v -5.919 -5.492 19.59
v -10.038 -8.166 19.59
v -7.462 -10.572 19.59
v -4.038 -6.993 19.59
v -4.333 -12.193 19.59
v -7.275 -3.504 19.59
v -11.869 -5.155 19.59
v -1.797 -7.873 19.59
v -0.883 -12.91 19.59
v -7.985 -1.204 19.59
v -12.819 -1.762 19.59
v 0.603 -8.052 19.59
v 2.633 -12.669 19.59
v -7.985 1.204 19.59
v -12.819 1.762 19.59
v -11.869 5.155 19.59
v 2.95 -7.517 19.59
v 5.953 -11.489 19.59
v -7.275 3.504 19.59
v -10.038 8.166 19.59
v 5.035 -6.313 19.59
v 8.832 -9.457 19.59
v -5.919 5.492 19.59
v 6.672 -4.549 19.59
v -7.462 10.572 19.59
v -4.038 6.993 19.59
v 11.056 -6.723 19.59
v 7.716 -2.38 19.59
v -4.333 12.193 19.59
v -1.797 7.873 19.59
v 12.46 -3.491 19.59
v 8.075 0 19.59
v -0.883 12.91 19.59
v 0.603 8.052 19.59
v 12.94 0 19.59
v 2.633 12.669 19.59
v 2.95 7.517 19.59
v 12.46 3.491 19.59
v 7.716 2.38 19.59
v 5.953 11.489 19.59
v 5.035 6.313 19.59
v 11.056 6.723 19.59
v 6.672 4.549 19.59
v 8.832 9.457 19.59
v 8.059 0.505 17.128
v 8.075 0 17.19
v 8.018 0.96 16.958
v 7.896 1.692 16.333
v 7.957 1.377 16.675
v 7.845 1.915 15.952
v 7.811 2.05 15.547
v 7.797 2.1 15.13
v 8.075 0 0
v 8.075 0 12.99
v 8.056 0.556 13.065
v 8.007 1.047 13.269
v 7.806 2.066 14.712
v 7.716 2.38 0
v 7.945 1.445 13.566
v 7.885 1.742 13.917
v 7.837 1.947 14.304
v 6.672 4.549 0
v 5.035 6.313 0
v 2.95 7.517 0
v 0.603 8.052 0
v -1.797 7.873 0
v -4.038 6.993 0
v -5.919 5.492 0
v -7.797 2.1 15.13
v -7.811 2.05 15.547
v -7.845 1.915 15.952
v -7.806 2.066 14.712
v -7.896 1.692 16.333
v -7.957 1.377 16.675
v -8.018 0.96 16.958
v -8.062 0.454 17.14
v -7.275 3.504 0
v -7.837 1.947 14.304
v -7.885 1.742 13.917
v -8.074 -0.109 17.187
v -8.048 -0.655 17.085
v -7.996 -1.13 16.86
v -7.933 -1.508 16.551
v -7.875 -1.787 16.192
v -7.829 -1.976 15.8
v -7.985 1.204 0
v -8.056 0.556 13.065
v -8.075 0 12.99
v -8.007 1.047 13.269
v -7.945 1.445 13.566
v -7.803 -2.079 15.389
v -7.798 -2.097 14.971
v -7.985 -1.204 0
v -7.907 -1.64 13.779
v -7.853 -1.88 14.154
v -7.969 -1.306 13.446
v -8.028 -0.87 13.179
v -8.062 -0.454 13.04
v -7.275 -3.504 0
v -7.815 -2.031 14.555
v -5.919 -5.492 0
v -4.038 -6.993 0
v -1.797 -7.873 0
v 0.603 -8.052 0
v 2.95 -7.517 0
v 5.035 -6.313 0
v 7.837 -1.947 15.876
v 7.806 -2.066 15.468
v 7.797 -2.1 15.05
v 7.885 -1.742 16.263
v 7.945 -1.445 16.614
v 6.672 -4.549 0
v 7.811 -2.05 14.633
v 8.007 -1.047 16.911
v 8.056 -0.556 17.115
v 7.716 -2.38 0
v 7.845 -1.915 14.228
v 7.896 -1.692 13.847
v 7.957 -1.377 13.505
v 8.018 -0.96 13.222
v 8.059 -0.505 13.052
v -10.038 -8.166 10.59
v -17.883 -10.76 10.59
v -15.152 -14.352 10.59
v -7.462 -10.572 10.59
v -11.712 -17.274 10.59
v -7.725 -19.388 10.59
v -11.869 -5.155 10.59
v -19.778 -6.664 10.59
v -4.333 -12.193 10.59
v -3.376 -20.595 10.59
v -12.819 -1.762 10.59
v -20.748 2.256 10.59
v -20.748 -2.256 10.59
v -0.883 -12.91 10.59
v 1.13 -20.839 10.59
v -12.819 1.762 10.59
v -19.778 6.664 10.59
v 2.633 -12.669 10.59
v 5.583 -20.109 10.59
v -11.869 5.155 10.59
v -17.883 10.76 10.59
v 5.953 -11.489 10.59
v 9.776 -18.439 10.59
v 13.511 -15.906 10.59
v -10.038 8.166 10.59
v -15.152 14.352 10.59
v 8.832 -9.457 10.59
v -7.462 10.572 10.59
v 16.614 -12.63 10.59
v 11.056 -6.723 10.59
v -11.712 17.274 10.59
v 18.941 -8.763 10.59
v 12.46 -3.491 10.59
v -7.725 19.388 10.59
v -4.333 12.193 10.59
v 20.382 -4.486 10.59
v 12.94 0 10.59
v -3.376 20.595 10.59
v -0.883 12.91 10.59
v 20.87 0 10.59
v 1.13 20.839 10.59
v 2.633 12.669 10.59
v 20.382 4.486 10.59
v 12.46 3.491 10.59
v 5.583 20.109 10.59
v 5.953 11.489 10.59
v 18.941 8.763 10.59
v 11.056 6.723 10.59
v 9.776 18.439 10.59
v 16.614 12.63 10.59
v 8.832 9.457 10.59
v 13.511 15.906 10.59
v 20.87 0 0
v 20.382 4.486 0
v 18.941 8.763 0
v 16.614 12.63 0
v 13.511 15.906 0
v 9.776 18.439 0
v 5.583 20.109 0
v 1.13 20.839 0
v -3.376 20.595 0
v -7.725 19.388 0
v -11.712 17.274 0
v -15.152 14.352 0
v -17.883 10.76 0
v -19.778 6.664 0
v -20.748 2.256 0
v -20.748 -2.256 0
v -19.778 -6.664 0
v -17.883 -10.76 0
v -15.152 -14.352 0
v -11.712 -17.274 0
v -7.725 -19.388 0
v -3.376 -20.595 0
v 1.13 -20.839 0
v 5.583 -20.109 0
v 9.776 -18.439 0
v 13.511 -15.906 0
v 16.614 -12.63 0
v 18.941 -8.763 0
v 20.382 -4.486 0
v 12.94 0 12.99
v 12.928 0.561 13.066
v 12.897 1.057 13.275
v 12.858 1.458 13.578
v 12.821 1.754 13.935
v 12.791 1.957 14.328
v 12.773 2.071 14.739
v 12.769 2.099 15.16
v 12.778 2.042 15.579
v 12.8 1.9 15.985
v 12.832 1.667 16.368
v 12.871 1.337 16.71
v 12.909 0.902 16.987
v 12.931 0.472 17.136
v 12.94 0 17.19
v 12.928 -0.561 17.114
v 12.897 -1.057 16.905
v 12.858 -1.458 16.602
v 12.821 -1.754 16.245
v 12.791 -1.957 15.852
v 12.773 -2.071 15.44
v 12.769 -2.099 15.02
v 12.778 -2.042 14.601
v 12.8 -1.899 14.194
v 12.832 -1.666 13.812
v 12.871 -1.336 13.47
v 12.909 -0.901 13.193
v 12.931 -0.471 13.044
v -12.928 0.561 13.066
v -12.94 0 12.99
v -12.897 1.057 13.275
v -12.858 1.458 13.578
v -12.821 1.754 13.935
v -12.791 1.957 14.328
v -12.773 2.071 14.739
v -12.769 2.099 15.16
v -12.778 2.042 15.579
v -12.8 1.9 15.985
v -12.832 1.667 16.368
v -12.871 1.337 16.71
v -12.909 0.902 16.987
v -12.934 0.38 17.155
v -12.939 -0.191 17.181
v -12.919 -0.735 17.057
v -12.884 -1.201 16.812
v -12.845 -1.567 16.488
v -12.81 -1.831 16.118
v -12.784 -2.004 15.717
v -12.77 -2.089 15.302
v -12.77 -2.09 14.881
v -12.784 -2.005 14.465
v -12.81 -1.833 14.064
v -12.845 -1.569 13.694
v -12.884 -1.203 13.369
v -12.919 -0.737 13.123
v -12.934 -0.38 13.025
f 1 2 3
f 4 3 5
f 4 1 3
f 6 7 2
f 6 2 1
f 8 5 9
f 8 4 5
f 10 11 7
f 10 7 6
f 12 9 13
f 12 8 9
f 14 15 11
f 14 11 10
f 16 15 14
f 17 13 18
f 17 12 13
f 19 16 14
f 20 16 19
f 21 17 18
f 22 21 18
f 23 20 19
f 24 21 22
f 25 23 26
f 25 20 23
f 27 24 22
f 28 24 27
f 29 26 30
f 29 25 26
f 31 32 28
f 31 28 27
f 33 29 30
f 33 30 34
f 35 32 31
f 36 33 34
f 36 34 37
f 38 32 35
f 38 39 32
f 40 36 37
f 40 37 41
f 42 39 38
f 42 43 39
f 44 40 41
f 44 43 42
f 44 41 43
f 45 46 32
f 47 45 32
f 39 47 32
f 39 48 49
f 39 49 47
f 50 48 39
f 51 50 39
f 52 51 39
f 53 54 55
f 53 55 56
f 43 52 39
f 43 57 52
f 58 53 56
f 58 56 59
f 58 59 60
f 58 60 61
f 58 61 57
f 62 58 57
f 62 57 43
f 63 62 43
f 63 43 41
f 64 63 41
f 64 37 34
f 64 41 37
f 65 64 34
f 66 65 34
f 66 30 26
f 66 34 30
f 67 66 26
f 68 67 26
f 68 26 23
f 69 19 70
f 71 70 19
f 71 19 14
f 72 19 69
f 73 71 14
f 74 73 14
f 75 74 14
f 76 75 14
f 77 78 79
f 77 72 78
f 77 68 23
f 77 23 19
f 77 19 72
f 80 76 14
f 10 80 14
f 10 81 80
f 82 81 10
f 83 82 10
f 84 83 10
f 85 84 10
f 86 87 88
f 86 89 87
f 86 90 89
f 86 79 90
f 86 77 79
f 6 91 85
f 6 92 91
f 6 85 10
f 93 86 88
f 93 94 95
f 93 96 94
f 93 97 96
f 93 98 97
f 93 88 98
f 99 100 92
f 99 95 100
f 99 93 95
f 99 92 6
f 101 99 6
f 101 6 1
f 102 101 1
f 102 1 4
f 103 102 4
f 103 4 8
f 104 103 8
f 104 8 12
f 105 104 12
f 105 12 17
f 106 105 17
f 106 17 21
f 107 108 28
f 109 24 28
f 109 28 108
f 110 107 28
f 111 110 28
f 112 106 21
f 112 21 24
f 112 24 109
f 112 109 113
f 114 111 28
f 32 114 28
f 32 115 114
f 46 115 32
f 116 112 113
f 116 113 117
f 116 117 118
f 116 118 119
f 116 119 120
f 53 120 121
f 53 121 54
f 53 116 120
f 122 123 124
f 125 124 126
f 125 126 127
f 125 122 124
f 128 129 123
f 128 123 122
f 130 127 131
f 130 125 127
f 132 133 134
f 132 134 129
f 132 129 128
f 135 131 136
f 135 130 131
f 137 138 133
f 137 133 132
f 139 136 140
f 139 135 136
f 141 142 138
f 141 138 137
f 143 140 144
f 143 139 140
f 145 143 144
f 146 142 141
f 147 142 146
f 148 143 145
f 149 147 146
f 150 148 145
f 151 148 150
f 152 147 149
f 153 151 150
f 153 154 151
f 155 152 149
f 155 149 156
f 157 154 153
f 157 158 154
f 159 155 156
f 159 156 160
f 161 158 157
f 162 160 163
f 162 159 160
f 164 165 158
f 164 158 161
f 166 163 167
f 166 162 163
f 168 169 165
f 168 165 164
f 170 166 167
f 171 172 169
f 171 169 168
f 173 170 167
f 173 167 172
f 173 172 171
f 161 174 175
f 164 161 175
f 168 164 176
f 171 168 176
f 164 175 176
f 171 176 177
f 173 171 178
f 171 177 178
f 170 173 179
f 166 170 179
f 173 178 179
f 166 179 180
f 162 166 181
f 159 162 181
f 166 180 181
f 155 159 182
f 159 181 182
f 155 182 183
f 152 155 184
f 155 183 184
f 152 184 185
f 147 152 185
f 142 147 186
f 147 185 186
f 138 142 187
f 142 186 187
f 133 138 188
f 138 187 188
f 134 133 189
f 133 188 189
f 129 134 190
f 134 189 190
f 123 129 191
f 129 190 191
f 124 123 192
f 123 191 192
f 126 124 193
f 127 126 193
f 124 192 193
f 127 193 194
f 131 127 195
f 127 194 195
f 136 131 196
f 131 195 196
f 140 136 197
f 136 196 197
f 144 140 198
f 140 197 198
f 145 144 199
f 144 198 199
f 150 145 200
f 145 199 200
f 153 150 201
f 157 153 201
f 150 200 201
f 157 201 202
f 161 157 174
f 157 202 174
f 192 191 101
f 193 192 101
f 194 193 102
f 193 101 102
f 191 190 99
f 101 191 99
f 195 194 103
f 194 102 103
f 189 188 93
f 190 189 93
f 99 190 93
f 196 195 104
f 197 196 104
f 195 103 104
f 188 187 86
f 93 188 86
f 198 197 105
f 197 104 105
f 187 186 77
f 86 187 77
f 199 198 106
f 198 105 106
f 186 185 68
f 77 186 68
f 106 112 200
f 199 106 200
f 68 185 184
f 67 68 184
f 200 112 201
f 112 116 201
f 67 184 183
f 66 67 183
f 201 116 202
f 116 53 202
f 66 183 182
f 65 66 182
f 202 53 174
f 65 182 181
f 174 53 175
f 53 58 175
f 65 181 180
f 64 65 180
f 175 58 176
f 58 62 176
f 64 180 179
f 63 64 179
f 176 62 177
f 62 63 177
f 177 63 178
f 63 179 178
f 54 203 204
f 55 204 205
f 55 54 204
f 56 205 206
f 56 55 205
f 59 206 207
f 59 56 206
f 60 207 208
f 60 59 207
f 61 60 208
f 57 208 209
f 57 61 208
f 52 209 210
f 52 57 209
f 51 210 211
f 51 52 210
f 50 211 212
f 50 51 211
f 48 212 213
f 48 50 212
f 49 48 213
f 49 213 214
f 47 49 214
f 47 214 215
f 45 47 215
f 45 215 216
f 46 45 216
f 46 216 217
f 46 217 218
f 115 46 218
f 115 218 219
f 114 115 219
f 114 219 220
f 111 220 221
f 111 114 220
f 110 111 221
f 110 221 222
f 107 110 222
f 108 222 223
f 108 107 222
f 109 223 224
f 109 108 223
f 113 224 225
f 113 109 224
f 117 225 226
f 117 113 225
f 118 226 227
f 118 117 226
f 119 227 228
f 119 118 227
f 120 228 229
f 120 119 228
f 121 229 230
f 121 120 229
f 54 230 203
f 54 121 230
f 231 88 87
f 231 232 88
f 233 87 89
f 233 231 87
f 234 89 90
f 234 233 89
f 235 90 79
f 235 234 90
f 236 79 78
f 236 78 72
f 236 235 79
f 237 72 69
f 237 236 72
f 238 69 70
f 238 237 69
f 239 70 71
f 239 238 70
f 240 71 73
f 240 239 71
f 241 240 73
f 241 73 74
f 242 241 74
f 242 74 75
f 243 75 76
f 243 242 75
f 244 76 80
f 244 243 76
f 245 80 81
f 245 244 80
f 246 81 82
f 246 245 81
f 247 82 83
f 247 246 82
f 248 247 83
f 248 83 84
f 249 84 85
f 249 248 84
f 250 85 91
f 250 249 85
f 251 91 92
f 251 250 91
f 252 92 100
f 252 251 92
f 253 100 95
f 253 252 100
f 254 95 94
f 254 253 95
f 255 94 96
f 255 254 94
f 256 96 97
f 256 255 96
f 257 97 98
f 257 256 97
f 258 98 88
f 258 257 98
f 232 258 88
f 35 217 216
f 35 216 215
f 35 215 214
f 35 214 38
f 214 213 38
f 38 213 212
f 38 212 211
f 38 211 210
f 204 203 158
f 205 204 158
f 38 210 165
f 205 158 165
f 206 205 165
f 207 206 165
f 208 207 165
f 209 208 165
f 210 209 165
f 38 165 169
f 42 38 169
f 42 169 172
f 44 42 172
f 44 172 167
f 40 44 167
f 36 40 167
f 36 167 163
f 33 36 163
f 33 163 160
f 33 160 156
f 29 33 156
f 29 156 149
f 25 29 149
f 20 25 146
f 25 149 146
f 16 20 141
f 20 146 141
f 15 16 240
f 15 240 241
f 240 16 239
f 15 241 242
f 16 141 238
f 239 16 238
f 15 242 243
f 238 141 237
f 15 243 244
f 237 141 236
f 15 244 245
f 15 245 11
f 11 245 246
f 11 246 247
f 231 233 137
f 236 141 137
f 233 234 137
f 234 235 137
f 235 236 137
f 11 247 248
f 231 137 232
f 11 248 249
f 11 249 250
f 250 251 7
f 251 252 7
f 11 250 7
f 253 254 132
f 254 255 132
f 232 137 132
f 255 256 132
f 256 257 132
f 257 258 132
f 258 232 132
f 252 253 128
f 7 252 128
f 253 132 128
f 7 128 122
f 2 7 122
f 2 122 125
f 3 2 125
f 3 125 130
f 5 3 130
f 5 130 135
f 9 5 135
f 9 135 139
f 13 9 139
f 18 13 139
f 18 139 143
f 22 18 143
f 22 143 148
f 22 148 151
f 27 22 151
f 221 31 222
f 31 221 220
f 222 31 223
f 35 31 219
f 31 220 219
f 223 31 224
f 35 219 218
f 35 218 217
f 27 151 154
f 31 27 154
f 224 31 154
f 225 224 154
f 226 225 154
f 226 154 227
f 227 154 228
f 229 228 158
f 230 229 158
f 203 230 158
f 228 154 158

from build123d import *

# Parameters (mm, degrees)
SKETCH1_R               = 20.87
BOSS_EXTRUDE1_DEPTH     = 10.59
SKETCH2_R               = 12.94
BOSS_EXTRUDE2_DEPTH     = 9
CUT_EXTRUDE1_DEPTH      = 36.424312273
CUT_EXTRUDE1_DEPTH_BACK = 36.424312273
SKETCH3_R               = 8.075
CUT_EXTRUDE2_DEPTH      = 36.424312273
CUT_EXTRUDE2_DEPTH_BACK = 36.424312273
SKETCH4_R               = 2.1


with BuildPart() as part:
    # Sketch1 → Boss-Extrude1 (new body)
    with BuildSketch(Plane(origin=(0, 0, 0), x_dir=(0, 1, 0), z_dir=(0, 0, 1))):
        with Locations(Location((0, 0, 0), (0, 0, 270))):
            Circle(SKETCH1_R)
    extrude(amount=BOSS_EXTRUDE1_DEPTH)

    # Sketch2 → Boss-Extrude2 (add)
    with BuildSketch(Plane.XY.offset(10.59)):
        Circle(SKETCH2_R)
    extrude(amount=BOSS_EXTRUDE2_DEPTH)

    # Sketch3 → Cut-Extrude1 (cut, two sides: drawn at the far end of the back side and taken through both)
    with BuildSketch(Plane.XY.offset(19.59).offset(-CUT_EXTRUDE1_DEPTH_BACK)):
        Circle(SKETCH3_R)
    extrude(amount=CUT_EXTRUDE1_DEPTH + CUT_EXTRUDE1_DEPTH_BACK, mode=Mode.SUBTRACT)

    # Sketch4 → Cut-Extrude2 (cut, two sides: drawn at the far end of the back side and taken through both)
    with BuildSketch(Plane.YZ.offset(-CUT_EXTRUDE2_DEPTH_BACK)):
        with Locations(Location((0, 15.09, 0), (0, 0, 270))):
            Circle(SKETCH4_R)
    extrude(amount=CUT_EXTRUDE2_DEPTH + CUT_EXTRUDE2_DEPTH_BACK, mode=Mode.SUBTRACT)


solid = part.part
